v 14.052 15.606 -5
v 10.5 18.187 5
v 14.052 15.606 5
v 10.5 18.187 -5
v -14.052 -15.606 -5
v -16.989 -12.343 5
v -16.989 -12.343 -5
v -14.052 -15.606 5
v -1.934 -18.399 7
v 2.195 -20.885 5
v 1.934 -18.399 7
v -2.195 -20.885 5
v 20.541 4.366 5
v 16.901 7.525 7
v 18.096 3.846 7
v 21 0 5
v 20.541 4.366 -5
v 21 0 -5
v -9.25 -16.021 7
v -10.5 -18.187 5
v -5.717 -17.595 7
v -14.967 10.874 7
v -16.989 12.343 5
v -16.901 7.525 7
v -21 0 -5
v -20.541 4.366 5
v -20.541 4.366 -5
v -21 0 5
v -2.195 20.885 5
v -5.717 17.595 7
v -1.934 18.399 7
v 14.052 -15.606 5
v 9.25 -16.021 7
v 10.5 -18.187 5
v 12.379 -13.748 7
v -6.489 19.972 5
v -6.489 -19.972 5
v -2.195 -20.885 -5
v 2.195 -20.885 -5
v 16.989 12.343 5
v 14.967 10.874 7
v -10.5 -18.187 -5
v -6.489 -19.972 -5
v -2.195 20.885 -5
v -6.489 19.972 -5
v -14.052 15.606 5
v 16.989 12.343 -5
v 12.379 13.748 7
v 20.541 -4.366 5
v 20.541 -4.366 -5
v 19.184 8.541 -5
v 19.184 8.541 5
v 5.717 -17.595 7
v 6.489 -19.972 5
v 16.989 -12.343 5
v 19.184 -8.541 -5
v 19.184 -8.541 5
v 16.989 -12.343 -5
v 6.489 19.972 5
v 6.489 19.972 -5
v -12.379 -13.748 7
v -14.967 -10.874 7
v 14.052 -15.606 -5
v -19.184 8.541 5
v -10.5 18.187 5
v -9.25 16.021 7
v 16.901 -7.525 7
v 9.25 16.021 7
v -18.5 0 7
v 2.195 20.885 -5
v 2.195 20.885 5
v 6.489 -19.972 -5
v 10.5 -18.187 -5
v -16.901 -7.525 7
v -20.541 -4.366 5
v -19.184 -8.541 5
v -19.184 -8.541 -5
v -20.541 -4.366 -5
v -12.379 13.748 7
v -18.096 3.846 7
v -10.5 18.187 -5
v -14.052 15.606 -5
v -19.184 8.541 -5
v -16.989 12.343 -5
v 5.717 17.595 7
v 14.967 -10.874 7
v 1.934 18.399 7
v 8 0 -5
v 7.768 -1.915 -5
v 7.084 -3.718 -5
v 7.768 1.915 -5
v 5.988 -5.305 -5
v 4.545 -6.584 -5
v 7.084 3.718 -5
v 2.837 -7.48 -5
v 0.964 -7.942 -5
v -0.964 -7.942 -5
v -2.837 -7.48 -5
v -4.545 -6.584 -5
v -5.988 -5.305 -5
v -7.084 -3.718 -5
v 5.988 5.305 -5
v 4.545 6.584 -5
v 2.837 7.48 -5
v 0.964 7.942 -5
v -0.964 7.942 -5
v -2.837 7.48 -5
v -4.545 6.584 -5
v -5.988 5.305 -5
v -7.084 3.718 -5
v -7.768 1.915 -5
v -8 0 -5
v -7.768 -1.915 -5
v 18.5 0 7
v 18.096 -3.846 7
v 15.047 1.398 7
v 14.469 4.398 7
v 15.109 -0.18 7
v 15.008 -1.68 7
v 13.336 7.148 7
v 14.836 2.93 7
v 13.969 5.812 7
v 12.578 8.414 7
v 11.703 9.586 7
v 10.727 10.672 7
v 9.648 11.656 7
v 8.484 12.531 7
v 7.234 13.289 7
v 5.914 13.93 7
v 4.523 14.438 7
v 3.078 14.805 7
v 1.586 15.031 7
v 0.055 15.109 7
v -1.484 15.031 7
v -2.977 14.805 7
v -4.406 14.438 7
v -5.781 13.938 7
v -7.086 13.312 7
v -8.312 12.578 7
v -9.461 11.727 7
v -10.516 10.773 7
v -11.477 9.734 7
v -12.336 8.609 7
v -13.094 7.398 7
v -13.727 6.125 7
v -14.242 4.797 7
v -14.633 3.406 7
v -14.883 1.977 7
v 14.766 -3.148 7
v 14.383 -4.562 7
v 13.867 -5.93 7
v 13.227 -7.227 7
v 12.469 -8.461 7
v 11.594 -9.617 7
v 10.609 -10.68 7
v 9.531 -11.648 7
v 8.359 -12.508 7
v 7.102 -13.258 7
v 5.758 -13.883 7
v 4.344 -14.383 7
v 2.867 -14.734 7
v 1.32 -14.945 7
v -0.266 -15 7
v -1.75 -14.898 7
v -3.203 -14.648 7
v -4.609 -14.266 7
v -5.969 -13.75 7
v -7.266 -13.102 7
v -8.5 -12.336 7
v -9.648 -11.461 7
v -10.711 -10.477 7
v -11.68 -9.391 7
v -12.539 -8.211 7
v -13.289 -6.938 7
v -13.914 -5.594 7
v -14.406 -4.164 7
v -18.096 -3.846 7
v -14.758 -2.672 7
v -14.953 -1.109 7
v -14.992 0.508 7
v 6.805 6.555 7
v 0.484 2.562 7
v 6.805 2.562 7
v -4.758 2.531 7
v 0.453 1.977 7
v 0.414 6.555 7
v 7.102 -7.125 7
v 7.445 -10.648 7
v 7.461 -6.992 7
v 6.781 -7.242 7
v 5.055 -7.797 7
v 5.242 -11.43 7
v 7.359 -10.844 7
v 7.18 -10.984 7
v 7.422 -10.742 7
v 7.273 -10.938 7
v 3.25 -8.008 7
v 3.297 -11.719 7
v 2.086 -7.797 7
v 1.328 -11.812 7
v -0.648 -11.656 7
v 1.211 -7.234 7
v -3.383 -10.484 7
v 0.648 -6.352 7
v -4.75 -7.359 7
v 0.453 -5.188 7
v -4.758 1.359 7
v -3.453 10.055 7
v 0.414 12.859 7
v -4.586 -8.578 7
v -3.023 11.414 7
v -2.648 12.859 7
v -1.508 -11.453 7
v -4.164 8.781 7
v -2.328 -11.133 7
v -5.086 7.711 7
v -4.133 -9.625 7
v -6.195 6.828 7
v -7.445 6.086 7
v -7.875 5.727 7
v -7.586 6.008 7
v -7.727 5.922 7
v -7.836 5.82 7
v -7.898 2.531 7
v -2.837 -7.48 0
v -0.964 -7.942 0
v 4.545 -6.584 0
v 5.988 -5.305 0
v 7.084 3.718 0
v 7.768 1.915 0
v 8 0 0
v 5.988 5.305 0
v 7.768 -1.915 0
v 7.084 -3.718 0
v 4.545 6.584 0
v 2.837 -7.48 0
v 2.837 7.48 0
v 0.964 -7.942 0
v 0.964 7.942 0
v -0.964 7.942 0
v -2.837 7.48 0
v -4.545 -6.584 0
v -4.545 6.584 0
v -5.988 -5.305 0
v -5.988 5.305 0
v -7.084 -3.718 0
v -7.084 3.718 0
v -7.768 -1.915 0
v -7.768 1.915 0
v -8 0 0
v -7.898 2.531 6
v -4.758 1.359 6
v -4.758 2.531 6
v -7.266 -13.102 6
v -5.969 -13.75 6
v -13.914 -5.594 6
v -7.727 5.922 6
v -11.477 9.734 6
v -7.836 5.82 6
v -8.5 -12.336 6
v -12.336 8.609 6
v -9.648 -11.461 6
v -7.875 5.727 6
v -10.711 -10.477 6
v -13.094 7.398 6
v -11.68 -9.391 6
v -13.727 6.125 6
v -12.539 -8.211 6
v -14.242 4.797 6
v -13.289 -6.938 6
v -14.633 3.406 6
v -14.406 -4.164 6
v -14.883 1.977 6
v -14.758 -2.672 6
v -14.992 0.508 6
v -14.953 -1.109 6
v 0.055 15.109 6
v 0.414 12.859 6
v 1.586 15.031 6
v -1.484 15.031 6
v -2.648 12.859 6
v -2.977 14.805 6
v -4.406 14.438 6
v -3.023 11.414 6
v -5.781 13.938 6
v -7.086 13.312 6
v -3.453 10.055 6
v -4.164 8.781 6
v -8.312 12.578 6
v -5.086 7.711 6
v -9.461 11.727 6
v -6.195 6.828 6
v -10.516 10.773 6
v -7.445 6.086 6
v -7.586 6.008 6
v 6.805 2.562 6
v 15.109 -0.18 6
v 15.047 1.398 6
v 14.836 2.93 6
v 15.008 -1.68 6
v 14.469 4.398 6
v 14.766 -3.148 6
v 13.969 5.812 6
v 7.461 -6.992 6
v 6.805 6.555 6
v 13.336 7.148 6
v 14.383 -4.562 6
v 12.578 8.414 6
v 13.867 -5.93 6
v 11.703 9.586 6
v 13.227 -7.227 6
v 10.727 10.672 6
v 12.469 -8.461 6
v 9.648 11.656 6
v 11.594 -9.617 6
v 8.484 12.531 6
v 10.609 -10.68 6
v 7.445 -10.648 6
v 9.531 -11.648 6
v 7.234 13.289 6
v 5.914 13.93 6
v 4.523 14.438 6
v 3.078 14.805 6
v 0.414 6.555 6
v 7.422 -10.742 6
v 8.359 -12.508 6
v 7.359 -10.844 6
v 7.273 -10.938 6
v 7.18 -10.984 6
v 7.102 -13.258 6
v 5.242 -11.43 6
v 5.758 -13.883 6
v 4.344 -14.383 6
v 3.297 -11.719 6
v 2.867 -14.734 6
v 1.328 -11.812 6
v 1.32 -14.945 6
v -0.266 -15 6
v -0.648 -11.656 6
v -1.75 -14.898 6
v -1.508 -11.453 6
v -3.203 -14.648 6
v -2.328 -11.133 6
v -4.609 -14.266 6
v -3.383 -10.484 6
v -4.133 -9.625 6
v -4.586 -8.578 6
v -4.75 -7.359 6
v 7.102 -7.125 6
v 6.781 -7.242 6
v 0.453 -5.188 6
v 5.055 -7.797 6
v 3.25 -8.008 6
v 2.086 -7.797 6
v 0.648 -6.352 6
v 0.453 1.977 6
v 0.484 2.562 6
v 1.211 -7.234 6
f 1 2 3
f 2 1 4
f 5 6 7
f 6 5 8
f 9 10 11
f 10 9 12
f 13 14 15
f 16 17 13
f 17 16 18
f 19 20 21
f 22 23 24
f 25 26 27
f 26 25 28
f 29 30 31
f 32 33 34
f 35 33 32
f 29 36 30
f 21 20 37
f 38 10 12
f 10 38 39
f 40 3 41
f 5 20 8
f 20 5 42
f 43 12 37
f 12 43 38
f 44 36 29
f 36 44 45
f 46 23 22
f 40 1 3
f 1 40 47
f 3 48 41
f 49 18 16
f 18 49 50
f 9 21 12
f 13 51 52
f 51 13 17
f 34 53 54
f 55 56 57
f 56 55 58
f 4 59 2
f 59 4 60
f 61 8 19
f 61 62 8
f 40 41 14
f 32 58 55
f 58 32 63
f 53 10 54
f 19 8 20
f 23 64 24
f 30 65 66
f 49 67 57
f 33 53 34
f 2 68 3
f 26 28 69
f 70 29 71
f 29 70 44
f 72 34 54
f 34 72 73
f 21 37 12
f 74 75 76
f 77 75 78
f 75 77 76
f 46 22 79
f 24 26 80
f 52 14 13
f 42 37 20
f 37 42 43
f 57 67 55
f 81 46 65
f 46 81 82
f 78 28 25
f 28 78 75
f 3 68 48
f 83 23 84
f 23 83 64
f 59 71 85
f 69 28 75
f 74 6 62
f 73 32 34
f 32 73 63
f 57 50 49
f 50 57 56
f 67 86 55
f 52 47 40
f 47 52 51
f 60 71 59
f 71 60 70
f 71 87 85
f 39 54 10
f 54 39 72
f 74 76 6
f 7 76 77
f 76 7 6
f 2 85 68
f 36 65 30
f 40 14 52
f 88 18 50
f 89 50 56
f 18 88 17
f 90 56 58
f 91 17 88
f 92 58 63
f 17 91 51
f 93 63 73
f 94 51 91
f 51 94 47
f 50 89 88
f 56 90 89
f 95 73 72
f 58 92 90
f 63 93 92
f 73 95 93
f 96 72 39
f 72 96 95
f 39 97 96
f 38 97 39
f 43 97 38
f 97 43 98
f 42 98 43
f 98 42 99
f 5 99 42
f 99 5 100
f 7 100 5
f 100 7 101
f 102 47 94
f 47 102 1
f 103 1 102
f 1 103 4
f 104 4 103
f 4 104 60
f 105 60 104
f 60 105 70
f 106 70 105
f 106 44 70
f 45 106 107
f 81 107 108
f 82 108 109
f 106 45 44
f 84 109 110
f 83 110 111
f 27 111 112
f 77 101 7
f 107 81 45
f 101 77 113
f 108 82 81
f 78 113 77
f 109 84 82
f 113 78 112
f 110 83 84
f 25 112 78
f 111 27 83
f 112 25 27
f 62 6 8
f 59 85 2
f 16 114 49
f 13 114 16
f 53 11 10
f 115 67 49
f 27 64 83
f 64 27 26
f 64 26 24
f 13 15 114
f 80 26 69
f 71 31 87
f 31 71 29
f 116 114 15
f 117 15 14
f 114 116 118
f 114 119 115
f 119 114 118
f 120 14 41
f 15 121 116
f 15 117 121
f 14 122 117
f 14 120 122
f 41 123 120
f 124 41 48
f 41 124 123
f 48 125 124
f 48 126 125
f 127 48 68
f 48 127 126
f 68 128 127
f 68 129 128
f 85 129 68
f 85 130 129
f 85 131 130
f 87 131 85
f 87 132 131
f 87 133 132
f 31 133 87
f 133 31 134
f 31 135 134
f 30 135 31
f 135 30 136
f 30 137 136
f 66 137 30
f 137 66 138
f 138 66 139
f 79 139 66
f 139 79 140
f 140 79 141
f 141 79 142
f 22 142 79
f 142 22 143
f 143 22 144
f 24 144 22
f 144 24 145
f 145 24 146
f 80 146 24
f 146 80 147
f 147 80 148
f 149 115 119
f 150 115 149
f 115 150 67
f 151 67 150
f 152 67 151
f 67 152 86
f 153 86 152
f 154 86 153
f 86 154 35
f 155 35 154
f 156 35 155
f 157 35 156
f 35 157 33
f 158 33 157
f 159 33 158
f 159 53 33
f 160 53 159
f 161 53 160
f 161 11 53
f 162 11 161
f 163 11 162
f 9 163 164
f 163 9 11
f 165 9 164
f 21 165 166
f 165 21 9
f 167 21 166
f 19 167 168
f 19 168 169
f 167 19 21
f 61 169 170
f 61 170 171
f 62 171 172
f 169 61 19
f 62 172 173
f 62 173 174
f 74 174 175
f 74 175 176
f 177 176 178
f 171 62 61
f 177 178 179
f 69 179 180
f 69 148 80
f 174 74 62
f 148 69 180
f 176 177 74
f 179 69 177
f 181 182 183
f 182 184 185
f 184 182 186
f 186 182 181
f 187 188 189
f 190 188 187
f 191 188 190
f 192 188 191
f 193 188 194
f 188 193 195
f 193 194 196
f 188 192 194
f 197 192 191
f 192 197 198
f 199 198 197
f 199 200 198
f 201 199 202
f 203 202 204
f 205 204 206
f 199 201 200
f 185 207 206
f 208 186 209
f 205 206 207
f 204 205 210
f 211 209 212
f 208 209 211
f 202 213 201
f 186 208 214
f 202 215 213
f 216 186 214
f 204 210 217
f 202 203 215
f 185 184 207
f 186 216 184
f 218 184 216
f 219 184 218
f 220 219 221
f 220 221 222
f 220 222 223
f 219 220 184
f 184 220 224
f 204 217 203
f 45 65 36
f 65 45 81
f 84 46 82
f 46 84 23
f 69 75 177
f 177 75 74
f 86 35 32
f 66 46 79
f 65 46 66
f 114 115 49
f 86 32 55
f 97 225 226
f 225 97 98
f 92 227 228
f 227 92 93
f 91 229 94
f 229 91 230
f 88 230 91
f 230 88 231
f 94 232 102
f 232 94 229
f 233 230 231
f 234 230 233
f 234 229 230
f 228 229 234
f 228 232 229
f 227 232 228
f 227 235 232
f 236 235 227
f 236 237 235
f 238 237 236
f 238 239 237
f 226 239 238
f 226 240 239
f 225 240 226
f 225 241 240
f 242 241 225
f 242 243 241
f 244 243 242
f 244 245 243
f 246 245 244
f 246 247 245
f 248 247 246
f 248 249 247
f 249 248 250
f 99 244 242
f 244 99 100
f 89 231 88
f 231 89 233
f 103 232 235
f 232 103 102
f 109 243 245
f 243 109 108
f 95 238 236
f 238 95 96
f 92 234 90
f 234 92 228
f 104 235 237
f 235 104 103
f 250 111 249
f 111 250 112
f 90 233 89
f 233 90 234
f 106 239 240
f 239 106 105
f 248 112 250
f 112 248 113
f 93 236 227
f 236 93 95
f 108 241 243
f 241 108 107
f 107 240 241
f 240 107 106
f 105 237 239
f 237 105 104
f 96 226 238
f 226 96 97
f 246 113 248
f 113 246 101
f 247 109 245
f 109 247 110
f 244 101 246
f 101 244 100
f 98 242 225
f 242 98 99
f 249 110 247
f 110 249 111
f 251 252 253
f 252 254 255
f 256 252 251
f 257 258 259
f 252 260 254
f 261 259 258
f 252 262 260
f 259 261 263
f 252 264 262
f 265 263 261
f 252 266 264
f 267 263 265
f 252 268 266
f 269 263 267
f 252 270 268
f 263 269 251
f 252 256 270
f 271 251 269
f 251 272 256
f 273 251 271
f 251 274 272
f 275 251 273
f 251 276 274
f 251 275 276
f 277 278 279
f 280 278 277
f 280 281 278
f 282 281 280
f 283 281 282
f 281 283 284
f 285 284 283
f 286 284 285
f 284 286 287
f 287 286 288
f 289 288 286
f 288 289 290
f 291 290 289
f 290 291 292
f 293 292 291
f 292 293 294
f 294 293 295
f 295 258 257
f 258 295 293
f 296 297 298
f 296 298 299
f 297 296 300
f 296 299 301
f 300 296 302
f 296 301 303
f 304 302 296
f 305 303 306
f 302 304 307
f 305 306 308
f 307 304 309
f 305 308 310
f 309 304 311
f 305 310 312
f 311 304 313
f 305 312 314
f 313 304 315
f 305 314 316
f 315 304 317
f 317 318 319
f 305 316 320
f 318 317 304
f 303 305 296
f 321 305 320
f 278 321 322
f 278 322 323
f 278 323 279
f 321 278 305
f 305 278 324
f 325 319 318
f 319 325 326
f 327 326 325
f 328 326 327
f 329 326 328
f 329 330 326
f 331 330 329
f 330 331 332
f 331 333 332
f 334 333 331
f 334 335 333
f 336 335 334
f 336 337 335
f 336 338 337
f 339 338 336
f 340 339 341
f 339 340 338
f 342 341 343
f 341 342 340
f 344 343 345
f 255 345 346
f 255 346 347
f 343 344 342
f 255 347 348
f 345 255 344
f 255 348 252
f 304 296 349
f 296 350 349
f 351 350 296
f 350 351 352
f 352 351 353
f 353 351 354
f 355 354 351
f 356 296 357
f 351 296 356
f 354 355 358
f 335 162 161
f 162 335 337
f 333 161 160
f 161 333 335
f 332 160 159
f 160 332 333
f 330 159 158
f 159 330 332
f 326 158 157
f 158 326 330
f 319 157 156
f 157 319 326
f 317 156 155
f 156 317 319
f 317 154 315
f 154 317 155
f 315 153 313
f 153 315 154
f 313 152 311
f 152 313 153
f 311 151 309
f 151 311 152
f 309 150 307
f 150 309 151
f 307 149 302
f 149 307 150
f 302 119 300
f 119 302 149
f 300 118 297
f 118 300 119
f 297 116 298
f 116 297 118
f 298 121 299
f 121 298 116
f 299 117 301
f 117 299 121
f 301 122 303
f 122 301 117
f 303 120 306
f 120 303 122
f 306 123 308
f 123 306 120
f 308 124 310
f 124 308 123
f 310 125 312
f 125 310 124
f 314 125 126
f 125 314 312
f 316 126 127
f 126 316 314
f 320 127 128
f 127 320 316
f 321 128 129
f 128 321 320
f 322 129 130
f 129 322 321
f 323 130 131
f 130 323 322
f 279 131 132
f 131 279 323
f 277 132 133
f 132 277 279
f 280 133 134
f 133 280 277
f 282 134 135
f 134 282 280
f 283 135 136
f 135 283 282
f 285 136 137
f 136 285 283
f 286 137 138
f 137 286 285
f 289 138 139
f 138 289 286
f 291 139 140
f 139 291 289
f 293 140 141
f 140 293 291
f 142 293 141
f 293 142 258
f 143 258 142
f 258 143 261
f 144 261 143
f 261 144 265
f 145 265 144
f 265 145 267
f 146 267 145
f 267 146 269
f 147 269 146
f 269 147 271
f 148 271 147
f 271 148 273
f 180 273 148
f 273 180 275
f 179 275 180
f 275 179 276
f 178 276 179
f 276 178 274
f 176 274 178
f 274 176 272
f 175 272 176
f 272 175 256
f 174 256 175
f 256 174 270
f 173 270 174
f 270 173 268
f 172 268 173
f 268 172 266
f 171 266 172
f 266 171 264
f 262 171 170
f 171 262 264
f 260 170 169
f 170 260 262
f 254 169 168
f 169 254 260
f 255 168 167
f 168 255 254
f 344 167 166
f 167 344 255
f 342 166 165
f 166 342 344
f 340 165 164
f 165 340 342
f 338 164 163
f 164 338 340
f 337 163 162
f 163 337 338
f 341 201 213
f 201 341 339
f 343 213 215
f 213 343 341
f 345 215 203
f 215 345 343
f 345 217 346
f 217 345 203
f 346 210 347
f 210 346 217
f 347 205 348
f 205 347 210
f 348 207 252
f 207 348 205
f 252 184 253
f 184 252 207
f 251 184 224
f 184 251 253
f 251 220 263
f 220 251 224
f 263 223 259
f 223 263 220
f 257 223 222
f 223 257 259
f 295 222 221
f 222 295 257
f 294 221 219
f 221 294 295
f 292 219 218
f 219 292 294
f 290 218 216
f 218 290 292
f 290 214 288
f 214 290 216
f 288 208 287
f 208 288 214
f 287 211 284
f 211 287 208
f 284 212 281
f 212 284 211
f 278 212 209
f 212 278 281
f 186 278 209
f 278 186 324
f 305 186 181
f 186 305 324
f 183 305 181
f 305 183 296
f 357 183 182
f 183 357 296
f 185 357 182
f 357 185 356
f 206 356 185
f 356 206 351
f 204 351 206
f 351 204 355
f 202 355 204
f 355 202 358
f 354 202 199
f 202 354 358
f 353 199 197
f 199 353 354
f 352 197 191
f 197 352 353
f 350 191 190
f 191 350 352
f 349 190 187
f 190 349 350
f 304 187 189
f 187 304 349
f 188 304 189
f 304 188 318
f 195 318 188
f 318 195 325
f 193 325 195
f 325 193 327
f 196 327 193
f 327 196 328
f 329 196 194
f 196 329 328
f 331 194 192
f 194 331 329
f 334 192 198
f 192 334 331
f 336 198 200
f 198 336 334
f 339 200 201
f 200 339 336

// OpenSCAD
// Wheel Hubcap

outside_dimension = 42;
inside_dimension = 16;

module hubcap() {
	difference() {
		hull() {
			translate([0,0,6])
				cylinder(d=outside_dimension-5,h=2,center=true);
			cylinder(d=outside_dimension,h=10,center=true);
		}
		translate([0,0,-3])
			cylinder(d=inside_dimension,h=6,center=true);
	}
}

difference() {
hubcap();
translate([-15,-15,6])
	linear_extrude(height=2)
	scale([8,8,1])
	import("t.dxf");
}
